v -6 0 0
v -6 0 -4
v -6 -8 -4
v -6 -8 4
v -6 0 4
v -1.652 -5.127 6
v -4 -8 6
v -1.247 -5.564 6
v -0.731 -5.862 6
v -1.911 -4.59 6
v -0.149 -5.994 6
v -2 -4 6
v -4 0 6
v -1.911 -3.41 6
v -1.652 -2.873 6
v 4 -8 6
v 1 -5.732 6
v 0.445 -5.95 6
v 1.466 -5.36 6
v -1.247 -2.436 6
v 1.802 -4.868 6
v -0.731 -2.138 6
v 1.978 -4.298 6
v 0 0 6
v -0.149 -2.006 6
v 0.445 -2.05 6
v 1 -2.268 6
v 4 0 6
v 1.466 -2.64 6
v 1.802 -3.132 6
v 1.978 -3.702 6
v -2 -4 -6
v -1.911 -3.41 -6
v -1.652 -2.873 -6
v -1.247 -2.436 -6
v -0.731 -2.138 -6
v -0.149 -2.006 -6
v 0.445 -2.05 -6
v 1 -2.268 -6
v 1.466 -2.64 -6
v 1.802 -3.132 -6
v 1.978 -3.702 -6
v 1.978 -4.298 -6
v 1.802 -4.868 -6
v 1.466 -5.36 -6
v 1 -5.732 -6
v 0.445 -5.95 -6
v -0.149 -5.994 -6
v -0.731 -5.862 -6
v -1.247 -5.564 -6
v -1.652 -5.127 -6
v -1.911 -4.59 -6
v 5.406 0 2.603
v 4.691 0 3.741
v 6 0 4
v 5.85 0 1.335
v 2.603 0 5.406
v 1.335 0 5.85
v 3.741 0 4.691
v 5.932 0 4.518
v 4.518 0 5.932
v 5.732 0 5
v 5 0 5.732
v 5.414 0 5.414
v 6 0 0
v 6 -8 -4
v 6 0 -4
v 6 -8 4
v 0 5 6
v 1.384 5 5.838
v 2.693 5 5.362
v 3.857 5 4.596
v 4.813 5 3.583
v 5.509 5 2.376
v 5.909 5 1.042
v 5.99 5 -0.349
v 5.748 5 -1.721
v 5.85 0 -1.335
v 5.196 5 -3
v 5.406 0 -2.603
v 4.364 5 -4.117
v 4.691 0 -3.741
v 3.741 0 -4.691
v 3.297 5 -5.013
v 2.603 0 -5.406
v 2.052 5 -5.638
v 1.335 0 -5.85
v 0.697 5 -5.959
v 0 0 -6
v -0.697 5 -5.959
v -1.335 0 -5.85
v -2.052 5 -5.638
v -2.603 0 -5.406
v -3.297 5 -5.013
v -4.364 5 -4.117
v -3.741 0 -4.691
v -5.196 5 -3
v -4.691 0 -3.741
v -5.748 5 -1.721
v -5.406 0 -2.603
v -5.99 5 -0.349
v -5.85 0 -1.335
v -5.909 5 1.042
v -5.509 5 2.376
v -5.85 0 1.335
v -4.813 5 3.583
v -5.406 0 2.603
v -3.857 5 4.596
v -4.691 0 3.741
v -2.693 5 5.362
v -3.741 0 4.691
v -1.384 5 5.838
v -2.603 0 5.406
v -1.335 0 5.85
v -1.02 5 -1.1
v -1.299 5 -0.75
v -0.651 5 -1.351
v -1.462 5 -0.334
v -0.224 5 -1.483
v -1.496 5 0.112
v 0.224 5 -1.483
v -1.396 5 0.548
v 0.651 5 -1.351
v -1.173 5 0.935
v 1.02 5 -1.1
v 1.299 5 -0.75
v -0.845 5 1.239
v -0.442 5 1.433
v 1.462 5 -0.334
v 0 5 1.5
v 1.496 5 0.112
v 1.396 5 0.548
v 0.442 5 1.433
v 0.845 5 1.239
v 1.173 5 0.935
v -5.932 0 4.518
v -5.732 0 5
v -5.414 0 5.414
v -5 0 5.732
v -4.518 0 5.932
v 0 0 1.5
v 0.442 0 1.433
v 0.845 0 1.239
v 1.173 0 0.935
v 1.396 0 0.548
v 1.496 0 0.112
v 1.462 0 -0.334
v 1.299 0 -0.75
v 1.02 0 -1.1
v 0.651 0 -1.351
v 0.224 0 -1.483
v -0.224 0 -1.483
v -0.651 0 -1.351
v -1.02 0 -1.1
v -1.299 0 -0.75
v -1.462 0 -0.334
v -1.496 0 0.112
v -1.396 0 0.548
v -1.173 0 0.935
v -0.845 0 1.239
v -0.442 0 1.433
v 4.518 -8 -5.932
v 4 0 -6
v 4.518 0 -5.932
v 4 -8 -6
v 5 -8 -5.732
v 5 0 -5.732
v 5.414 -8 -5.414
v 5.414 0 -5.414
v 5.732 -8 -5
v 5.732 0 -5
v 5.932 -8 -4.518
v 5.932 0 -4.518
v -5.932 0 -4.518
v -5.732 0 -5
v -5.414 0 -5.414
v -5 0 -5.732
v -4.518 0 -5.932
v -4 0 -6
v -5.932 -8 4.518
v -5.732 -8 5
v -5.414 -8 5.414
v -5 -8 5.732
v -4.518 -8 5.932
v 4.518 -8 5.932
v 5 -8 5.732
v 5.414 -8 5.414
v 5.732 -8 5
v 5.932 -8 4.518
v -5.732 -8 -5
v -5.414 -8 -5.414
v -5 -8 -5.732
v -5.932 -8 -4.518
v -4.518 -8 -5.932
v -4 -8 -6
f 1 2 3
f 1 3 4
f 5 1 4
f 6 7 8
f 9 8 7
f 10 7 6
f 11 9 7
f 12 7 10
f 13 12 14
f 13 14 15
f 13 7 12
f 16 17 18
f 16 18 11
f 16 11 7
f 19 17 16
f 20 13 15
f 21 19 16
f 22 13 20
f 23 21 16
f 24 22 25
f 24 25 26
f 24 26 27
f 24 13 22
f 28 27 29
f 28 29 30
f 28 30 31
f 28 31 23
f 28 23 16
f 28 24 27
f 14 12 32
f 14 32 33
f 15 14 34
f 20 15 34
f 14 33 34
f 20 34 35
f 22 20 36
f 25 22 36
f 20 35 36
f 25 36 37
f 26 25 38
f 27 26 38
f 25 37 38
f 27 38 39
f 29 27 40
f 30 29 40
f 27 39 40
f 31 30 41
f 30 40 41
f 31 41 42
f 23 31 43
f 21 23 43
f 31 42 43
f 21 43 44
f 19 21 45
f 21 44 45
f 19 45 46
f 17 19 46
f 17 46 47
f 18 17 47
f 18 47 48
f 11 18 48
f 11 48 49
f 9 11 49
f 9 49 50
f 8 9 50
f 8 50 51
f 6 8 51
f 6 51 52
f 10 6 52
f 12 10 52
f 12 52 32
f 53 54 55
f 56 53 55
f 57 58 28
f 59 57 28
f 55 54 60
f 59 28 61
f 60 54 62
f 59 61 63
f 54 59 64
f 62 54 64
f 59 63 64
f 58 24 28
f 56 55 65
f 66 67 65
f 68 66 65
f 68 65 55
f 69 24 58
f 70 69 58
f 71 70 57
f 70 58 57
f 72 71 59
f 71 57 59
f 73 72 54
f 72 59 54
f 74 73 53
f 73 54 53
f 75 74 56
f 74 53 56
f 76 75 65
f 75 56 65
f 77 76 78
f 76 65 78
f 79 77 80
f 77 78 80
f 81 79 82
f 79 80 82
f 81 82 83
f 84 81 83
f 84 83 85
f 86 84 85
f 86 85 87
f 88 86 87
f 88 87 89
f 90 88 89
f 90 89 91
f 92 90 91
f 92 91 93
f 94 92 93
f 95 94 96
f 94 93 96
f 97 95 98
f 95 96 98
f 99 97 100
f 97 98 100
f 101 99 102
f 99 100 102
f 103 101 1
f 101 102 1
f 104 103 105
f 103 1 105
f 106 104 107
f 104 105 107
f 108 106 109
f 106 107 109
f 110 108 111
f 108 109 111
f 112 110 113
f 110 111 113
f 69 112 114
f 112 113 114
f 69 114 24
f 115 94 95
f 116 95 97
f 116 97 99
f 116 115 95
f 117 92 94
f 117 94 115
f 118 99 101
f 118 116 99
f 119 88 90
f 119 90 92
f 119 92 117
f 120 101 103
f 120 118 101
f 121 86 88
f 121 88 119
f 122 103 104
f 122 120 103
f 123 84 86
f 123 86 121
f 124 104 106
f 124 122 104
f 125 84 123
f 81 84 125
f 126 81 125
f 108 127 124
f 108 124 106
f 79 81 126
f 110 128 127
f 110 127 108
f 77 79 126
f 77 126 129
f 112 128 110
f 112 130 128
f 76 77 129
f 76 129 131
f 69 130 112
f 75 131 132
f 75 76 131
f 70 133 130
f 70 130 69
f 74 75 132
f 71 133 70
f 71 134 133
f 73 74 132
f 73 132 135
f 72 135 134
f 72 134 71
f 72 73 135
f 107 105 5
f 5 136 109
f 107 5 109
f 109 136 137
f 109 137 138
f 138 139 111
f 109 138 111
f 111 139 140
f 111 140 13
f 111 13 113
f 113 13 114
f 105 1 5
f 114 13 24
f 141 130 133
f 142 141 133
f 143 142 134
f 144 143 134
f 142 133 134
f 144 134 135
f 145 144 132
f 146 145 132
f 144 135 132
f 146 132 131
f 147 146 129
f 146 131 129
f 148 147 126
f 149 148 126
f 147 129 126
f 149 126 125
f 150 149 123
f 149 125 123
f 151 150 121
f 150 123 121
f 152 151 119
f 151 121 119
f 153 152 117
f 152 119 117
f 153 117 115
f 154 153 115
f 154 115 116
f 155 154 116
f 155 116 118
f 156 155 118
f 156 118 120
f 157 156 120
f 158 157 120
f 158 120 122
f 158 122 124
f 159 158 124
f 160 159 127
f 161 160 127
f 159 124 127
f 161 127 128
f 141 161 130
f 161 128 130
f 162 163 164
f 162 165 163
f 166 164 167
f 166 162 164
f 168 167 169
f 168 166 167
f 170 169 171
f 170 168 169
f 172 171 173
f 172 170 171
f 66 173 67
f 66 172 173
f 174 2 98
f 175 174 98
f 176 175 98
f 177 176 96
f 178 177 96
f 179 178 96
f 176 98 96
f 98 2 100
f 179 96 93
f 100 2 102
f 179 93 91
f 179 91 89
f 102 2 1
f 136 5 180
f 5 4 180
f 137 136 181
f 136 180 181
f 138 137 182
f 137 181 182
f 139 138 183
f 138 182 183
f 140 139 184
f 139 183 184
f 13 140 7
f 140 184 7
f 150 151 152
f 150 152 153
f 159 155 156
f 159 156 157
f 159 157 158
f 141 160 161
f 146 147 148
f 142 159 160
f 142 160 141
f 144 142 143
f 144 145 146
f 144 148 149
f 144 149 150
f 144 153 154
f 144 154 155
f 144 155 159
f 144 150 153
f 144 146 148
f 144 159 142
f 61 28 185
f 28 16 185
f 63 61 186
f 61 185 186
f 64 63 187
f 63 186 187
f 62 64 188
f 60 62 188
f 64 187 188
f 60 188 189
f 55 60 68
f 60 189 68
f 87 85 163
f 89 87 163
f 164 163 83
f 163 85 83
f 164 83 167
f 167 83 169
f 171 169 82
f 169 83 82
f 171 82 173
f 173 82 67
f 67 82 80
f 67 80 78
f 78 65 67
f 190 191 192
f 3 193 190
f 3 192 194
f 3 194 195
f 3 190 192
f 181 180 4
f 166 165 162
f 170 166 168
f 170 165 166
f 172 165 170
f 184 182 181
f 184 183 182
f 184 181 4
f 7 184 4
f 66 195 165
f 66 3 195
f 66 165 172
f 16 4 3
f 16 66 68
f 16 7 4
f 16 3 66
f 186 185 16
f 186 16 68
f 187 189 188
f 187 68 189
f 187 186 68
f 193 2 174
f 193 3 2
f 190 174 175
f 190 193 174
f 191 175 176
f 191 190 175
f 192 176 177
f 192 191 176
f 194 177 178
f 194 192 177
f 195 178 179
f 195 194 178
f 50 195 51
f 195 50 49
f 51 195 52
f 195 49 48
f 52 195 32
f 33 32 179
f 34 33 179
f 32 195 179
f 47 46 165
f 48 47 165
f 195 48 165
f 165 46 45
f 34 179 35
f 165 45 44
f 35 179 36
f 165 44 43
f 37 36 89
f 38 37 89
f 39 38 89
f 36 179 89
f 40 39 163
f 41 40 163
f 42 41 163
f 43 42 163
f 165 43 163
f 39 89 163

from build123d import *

# Parameters (mm, degrees)
SKETCH_1_R          = 6
EXTRUDE_1_DEPTH     = 5
SKETCH_2_W          = 12
SKETCH_2_H          = 12
EXTRUDE_2_DEPTH     = 8
FILLET_1_R          = 2
SKETCH_3_R          = 1.5
CUT_EXTRUDE_1_DEPTH = 5
SKETCH_4_R          = 2
CUT_EXTRUDE_2_DEPTH = 16.620499352


with BuildPart() as part:
    # 草图1 → 凸台-拉伸1 (new body)
    with BuildSketch(Plane(origin=(0, 0, 0), x_dir=(1, 0, 0), z_dir=(0, 1, 0))):
        with Locations(Location((0, 0, 0), (0, 0, 270))):
            Circle(SKETCH_1_R)
    extrude(amount=EXTRUDE_1_DEPTH)

    # 草图2 → 凸台-拉伸2 (add)
    with BuildSketch(Plane.XZ):
        Rectangle(SKETCH_2_W, SKETCH_2_H)
    extrude(amount=EXTRUDE_2_DEPTH)

    # 圆角1
    fillet_1_edges = [part.edges().sort_by_distance(p)[0] for p in [
        (-6, -4, 6),
        (-6, -4, -6),
        (6, -4, -6),
        (6, -4, 6),
    ]]
    fillet(fillet_1_edges, radius=FILLET_1_R)

    # 草图3 → 切除-拉伸1 (cut)
    with BuildSketch(Plane(origin=(0, 5, 0), x_dir=(1, 0, 0), z_dir=(0, 1, 0))):
        with Locations(Location((0, 0, 0), (0, 0, 270))):
            Circle(SKETCH_3_R)
    extrude(amount=-CUT_EXTRUDE_1_DEPTH, mode=Mode.SUBTRACT)

    # 草图4 → 切除-拉伸2 (cut, through all)
    with BuildSketch(Plane(origin=(0, 0, -6), x_dir=(-1, 0, 0), z_dir=(0, 0, -1))):
        with Locations((0, -4)):
            Circle(SKETCH_4_R)
    extrude(amount=-CUT_EXTRUDE_2_DEPTH, mode=Mode.SUBTRACT)


solid = part.part
